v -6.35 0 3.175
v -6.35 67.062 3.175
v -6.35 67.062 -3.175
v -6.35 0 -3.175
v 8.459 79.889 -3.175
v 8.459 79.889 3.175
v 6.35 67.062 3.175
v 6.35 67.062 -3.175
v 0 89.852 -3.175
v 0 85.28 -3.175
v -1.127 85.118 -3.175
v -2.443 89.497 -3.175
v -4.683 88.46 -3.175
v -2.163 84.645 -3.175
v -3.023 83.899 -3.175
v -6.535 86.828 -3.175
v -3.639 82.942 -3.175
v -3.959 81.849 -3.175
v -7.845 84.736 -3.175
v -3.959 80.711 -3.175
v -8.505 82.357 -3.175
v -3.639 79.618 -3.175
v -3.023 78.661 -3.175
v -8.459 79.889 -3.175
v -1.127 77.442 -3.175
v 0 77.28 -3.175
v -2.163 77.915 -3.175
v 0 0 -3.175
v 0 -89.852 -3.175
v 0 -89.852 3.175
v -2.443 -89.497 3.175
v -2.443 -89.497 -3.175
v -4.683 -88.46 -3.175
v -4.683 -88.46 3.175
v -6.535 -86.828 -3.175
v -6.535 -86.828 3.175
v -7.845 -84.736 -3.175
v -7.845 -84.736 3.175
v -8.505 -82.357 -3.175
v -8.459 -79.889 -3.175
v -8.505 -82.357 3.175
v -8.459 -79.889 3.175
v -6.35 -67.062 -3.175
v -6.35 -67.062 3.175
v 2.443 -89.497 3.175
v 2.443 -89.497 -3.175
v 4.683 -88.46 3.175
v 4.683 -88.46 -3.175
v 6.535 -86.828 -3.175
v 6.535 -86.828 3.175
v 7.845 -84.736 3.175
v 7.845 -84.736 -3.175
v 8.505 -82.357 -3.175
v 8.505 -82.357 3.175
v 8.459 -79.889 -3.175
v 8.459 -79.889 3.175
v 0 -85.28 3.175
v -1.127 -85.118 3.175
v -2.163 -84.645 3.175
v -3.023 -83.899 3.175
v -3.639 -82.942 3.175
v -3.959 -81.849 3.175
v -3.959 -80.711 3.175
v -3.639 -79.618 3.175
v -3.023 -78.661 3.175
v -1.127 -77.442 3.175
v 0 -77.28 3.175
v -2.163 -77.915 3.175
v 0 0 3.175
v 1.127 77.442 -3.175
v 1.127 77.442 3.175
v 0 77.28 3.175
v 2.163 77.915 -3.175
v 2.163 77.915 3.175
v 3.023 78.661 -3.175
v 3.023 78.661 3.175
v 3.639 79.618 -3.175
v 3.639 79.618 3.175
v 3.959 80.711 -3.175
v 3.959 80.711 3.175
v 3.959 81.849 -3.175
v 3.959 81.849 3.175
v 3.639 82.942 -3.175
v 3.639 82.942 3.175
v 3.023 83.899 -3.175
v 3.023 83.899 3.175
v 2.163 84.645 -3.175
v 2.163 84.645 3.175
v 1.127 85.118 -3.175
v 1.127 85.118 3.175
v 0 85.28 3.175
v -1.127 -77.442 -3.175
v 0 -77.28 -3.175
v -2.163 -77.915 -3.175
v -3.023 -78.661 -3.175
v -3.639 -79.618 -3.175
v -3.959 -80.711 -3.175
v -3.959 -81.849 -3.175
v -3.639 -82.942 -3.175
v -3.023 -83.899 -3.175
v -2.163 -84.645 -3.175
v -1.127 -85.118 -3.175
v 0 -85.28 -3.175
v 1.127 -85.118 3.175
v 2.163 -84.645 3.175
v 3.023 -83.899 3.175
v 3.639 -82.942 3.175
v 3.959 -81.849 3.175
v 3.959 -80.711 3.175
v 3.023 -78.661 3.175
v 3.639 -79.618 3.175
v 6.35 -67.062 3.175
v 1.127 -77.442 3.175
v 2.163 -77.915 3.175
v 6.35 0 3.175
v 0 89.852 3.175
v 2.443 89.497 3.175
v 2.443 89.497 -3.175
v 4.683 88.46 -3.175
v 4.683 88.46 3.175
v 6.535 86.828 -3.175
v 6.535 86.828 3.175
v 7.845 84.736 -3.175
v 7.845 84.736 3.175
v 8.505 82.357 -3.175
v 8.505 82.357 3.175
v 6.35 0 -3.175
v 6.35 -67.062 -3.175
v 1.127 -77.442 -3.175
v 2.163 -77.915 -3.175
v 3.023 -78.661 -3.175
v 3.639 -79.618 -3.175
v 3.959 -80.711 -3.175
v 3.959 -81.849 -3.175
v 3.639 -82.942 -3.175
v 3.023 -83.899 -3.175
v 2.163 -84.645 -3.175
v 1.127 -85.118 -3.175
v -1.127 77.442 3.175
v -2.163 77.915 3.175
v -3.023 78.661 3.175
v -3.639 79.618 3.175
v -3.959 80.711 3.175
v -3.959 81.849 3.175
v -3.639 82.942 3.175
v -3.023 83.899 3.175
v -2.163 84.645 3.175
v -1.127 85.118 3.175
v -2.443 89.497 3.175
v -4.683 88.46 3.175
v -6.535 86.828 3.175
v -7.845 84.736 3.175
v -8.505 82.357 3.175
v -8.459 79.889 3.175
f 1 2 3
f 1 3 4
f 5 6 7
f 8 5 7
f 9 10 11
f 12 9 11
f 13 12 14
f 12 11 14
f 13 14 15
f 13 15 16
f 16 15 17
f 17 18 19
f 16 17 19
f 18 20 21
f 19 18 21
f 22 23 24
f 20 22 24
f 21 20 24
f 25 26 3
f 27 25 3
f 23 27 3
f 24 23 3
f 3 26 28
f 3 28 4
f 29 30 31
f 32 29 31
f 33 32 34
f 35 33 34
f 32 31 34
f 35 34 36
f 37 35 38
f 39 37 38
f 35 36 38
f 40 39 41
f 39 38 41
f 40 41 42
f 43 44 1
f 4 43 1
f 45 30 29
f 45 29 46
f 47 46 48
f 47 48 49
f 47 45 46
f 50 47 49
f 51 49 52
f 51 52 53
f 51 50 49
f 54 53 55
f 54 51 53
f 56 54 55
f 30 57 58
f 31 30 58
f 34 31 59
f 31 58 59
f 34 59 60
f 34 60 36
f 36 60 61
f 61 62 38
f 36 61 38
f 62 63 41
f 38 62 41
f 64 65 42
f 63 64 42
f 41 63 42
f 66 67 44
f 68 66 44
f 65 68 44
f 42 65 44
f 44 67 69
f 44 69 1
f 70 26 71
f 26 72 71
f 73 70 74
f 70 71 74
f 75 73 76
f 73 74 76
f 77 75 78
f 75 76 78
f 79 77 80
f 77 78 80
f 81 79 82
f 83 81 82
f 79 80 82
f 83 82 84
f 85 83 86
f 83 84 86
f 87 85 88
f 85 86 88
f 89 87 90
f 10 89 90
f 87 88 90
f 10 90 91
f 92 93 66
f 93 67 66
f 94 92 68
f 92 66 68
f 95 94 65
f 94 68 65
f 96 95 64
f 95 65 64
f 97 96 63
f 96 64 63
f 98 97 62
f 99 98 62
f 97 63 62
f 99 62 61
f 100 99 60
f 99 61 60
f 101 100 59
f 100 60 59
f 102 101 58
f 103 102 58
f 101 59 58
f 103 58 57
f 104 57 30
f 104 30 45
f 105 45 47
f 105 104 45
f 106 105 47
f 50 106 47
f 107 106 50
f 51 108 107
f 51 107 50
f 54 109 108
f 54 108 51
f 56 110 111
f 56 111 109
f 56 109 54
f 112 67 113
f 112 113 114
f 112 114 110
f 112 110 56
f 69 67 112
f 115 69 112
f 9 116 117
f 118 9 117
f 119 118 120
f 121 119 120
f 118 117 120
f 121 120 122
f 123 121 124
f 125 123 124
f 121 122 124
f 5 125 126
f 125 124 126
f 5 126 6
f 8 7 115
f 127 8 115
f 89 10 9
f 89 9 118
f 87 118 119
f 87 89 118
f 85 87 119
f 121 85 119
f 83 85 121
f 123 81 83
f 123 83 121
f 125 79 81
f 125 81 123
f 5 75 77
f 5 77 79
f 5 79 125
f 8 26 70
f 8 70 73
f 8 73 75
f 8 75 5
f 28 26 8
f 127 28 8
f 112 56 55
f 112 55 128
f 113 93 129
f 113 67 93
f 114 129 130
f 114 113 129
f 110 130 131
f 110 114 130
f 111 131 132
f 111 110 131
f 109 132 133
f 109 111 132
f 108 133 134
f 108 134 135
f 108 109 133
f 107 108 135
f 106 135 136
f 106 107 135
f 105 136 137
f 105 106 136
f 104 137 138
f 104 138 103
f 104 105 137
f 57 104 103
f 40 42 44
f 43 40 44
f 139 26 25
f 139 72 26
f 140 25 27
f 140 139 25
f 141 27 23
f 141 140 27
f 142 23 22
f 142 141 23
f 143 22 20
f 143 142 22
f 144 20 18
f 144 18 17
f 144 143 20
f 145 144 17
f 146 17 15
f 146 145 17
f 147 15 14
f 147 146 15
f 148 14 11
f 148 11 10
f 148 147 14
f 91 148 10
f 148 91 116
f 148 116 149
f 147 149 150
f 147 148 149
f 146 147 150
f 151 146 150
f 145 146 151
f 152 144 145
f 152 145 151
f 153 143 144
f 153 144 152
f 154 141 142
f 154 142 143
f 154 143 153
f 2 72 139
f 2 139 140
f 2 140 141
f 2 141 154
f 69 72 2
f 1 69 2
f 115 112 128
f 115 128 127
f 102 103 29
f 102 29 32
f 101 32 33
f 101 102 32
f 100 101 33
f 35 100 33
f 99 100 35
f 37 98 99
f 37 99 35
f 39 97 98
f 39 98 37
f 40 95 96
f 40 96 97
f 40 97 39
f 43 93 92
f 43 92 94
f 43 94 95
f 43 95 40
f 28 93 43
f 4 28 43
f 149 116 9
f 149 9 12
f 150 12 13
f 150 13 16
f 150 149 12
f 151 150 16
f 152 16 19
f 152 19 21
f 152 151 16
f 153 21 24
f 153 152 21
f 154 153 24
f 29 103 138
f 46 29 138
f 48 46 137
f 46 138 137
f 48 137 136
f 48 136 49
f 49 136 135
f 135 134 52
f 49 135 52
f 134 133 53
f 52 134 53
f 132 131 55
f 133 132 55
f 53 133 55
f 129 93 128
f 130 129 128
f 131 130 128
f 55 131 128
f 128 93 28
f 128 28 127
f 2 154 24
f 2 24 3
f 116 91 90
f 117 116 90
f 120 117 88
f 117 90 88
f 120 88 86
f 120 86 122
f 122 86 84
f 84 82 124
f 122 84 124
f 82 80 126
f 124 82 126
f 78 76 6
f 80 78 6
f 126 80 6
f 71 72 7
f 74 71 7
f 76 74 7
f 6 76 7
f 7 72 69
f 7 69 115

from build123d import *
from build123d import SkipClean  # not in build123d's __all__

# Parameters (mm, degrees)
F1_DEPTH = 3.175


with BuildPart() as f1:
    # F0 (on Top) → F1 (new body, symmetric)
    with BuildSketch(Plane.XY):
        with BuildLine():
            ThreePointArc((0, -77.28), (4, -81.28), (0, -85.28))
            Line((0, -85.28), (0, -89.8525))
            ThreePointArc((0, -89.8525), (6.5348908987, -86.8282391073), (8.4589413231, -79.8892922874))
            Line((8.4589413231, -79.8892922874), (6.35, -67.061714828))
            Line((6.35, -67.061714828), (6.35, 0))
            Line((6.35, 0), (0, 0))
            Line((0, 0), (0, -77.28))
        make_face()
    extrude(amount=F1_DEPTH, both=True)

    # F2: F1 across plane


with BuildPart() as f1_1:
    add(f1.part, clean=False)
    with SkipClean():  # cleaning this boolean's faces spoils the solid; the shape is the same uncleaned
        add(f1.part.mirror(Plane.YZ), clean=False)

    # F3: F1 across plane


with BuildPart() as f1_2:
    add(f1_1.part, clean=False)
    add(f1_1.part.mirror(Plane.XZ), clean=False)


solid = f1_2.part
